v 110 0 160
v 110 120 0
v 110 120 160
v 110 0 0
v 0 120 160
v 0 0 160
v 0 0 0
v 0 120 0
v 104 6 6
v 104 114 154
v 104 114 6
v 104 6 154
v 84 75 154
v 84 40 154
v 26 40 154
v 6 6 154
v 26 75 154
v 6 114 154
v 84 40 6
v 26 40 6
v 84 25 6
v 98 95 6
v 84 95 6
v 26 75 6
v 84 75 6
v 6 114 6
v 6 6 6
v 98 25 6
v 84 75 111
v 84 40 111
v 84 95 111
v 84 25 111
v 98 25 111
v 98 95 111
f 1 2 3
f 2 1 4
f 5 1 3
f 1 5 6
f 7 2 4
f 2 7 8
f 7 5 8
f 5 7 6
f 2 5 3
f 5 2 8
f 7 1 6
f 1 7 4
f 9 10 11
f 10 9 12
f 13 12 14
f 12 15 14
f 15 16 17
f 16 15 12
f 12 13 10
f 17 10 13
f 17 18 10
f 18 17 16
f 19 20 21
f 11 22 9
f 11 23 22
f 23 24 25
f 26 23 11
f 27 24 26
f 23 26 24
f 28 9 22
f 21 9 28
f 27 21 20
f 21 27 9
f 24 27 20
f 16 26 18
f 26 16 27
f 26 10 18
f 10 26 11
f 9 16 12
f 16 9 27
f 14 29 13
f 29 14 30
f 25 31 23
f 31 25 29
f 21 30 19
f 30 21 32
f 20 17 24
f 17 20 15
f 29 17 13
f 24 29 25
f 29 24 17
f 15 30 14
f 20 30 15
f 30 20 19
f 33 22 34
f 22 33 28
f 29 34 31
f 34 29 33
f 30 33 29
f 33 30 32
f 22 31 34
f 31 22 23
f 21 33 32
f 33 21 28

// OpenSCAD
// Inert surroundings only; not an electrophoresis vessel. Millimetres.
// Complete 110x120x160 external envelope from XCell SureLock user guide.
// 6 mm walls; internal core/wedge are estimated visible envelopes.
difference(){cube([110,120,160]);translate([6,6,6])cube([98,108,148]);}
translate([26,40,6])cube([58,35,148]);
translate([84,25,6])cube([14,70,105]);
